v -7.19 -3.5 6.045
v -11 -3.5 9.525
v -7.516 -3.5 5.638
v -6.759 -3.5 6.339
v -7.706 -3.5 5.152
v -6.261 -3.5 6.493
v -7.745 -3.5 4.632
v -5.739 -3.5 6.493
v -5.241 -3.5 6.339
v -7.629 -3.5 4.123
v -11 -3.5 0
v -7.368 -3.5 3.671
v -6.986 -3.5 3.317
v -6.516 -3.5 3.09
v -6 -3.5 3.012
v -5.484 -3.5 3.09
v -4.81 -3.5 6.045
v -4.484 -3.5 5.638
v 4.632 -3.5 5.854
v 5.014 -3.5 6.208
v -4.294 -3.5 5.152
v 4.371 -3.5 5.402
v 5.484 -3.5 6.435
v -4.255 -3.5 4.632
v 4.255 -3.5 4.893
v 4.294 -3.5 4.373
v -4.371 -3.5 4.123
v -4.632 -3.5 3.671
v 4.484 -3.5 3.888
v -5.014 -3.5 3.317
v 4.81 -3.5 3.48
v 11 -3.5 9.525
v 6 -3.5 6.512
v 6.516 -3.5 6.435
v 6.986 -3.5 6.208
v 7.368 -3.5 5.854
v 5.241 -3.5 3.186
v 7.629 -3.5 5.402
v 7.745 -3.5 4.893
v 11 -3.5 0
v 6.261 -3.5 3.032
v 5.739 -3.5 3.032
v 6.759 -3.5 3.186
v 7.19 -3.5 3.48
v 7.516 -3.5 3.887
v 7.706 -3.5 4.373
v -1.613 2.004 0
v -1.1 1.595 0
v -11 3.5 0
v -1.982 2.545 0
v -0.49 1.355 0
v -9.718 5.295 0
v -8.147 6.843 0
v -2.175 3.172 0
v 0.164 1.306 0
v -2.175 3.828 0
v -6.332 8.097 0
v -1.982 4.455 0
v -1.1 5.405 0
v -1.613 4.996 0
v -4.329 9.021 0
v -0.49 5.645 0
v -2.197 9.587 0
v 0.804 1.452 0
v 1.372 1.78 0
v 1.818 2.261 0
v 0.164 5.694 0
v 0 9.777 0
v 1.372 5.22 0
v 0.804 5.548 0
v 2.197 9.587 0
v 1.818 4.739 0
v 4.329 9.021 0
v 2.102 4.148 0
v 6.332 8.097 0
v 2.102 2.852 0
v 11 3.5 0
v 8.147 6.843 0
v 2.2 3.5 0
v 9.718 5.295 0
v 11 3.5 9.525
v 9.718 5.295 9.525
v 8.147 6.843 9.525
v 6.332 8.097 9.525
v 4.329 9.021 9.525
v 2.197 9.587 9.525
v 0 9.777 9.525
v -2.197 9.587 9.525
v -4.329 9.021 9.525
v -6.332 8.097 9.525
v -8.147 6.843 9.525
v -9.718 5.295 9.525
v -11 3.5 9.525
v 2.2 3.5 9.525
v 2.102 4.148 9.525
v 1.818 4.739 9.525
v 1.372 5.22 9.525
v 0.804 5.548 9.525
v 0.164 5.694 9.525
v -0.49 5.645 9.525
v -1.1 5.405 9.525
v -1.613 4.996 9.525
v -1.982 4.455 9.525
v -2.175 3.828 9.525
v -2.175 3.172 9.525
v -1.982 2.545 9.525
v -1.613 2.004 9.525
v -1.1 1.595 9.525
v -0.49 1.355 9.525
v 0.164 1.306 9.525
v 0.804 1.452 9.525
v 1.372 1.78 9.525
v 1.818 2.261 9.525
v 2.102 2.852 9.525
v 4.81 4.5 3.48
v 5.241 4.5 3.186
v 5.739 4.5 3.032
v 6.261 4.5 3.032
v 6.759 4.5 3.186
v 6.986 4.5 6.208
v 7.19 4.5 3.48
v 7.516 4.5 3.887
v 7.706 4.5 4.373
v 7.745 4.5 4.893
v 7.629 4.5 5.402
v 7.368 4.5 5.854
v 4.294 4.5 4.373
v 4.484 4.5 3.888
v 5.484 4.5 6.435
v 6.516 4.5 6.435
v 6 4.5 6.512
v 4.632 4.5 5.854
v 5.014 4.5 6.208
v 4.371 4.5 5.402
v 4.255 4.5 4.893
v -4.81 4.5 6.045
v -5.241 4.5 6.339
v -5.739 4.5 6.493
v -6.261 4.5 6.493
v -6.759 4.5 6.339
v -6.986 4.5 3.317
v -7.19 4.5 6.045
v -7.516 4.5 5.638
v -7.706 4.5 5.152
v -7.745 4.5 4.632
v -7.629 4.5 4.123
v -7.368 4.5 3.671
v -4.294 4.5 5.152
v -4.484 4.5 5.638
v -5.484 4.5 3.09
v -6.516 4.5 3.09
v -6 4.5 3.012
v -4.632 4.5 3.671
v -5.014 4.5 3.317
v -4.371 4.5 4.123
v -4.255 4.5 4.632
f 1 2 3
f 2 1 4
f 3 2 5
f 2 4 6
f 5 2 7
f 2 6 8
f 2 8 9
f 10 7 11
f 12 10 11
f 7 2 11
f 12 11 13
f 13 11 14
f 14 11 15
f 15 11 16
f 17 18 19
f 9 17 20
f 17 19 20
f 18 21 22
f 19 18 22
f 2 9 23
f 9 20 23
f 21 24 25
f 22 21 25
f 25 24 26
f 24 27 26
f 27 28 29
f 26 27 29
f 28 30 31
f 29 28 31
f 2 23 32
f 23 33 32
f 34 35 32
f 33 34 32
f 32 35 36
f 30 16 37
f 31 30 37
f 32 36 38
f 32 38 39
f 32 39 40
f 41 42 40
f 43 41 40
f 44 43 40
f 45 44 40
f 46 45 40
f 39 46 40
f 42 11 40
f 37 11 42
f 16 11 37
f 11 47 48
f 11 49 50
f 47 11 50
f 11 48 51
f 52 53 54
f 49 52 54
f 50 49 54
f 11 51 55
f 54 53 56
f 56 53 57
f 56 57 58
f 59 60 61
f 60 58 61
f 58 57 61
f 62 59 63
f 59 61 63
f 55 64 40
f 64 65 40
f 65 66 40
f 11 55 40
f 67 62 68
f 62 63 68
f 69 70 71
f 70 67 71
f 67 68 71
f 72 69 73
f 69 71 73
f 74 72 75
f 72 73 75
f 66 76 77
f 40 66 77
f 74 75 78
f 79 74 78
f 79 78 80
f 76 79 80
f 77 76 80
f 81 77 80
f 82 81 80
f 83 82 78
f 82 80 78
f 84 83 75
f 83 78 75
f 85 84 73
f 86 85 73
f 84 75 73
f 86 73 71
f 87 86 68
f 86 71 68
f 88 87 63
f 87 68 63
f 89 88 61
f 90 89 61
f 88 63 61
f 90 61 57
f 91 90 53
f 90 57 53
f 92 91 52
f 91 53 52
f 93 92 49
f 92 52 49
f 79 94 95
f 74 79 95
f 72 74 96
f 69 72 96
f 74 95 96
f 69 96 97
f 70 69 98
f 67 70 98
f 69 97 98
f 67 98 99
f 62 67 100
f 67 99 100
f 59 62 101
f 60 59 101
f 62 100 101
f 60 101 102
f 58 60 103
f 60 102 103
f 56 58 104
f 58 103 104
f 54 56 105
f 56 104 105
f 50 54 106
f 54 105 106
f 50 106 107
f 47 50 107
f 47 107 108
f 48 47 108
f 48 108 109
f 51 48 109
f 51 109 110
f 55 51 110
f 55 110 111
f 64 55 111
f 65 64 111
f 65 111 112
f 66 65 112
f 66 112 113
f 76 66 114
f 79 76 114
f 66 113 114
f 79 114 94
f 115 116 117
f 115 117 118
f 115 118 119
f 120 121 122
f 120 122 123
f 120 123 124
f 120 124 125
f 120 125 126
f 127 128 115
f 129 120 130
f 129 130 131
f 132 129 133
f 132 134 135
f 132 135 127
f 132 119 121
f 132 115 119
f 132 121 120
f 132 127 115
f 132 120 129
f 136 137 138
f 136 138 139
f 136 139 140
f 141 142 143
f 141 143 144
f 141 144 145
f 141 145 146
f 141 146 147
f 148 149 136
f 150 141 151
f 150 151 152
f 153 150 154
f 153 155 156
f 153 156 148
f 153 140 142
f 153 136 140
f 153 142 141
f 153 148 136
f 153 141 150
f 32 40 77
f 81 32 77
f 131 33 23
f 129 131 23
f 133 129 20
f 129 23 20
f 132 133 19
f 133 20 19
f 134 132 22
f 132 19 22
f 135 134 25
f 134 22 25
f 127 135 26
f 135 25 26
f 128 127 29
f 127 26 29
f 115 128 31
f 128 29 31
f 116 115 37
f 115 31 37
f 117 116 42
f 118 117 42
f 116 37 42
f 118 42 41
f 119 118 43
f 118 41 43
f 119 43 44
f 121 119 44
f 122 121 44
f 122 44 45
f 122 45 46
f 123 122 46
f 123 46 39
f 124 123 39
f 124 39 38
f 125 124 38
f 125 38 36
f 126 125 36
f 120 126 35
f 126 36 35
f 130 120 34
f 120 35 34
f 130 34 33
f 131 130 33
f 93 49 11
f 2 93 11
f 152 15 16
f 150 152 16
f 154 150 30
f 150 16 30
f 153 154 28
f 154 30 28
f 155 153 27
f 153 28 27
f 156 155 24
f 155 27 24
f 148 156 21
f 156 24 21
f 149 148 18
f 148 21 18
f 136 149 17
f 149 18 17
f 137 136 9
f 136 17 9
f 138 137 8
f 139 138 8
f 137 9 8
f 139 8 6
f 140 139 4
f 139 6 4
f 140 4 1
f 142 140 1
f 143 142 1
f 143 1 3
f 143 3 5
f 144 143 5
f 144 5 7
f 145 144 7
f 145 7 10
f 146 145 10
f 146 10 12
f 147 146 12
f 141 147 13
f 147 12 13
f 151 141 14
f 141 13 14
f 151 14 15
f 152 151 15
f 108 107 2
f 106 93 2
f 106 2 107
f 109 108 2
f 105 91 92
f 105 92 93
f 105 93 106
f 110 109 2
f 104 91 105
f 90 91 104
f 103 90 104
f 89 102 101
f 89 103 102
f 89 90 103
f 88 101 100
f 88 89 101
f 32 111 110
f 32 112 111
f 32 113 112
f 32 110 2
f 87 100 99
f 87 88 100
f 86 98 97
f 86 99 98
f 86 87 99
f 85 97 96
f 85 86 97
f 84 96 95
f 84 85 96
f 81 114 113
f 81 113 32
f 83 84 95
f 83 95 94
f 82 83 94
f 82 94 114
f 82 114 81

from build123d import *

# Parameters (mm, degrees)
BOSS_EXTRUDE1_DEPTH = 9.525
SKETCH2_R           = 2.2
M5_DRILL_DEPTH      = 9.525
SKETCH3_R           = 1.75
M4_DRILL_DEPTH      = 8


with BuildPart() as part:
    # Sketch1 → Boss-Extrude1 (new body)
    with BuildSketch(Plane.XY):
        with BuildLine():
            Line((-11, 3.5), (-11, -3.5))
            Line((-11, -3.5), (11, -3.5))
            Line((11, -3.5), (11, 3.5))
            ThreePointArc((11, 3.5), (0, 9.776932339), (-11, 3.5))
        make_face()
    extrude(amount=BOSS_EXTRUDE1_DEPTH)

    # Sketch2 → M5_DRILL (cut)
    with BuildSketch(Plane.XY.offset(9.525)):
        with Locations((0, 3.5)):
            Circle(SKETCH2_R)
    extrude(amount=-M5_DRILL_DEPTH, mode=Mode.SUBTRACT)

    # Sketch3 → M4_DRILL (cut)
    with BuildSketch(Plane.XZ.offset(3.5)):
        with Locations(Location((-6, 4.7625, 0), (0, 0, 270))):
            Circle(SKETCH3_R)
        with Locations(Location((6, 4.7625, 0), (0, 0, 90))):
            Circle(SKETCH3_R)
    extrude(amount=-M4_DRILL_DEPTH, mode=Mode.SUBTRACT)


solid = part.part
